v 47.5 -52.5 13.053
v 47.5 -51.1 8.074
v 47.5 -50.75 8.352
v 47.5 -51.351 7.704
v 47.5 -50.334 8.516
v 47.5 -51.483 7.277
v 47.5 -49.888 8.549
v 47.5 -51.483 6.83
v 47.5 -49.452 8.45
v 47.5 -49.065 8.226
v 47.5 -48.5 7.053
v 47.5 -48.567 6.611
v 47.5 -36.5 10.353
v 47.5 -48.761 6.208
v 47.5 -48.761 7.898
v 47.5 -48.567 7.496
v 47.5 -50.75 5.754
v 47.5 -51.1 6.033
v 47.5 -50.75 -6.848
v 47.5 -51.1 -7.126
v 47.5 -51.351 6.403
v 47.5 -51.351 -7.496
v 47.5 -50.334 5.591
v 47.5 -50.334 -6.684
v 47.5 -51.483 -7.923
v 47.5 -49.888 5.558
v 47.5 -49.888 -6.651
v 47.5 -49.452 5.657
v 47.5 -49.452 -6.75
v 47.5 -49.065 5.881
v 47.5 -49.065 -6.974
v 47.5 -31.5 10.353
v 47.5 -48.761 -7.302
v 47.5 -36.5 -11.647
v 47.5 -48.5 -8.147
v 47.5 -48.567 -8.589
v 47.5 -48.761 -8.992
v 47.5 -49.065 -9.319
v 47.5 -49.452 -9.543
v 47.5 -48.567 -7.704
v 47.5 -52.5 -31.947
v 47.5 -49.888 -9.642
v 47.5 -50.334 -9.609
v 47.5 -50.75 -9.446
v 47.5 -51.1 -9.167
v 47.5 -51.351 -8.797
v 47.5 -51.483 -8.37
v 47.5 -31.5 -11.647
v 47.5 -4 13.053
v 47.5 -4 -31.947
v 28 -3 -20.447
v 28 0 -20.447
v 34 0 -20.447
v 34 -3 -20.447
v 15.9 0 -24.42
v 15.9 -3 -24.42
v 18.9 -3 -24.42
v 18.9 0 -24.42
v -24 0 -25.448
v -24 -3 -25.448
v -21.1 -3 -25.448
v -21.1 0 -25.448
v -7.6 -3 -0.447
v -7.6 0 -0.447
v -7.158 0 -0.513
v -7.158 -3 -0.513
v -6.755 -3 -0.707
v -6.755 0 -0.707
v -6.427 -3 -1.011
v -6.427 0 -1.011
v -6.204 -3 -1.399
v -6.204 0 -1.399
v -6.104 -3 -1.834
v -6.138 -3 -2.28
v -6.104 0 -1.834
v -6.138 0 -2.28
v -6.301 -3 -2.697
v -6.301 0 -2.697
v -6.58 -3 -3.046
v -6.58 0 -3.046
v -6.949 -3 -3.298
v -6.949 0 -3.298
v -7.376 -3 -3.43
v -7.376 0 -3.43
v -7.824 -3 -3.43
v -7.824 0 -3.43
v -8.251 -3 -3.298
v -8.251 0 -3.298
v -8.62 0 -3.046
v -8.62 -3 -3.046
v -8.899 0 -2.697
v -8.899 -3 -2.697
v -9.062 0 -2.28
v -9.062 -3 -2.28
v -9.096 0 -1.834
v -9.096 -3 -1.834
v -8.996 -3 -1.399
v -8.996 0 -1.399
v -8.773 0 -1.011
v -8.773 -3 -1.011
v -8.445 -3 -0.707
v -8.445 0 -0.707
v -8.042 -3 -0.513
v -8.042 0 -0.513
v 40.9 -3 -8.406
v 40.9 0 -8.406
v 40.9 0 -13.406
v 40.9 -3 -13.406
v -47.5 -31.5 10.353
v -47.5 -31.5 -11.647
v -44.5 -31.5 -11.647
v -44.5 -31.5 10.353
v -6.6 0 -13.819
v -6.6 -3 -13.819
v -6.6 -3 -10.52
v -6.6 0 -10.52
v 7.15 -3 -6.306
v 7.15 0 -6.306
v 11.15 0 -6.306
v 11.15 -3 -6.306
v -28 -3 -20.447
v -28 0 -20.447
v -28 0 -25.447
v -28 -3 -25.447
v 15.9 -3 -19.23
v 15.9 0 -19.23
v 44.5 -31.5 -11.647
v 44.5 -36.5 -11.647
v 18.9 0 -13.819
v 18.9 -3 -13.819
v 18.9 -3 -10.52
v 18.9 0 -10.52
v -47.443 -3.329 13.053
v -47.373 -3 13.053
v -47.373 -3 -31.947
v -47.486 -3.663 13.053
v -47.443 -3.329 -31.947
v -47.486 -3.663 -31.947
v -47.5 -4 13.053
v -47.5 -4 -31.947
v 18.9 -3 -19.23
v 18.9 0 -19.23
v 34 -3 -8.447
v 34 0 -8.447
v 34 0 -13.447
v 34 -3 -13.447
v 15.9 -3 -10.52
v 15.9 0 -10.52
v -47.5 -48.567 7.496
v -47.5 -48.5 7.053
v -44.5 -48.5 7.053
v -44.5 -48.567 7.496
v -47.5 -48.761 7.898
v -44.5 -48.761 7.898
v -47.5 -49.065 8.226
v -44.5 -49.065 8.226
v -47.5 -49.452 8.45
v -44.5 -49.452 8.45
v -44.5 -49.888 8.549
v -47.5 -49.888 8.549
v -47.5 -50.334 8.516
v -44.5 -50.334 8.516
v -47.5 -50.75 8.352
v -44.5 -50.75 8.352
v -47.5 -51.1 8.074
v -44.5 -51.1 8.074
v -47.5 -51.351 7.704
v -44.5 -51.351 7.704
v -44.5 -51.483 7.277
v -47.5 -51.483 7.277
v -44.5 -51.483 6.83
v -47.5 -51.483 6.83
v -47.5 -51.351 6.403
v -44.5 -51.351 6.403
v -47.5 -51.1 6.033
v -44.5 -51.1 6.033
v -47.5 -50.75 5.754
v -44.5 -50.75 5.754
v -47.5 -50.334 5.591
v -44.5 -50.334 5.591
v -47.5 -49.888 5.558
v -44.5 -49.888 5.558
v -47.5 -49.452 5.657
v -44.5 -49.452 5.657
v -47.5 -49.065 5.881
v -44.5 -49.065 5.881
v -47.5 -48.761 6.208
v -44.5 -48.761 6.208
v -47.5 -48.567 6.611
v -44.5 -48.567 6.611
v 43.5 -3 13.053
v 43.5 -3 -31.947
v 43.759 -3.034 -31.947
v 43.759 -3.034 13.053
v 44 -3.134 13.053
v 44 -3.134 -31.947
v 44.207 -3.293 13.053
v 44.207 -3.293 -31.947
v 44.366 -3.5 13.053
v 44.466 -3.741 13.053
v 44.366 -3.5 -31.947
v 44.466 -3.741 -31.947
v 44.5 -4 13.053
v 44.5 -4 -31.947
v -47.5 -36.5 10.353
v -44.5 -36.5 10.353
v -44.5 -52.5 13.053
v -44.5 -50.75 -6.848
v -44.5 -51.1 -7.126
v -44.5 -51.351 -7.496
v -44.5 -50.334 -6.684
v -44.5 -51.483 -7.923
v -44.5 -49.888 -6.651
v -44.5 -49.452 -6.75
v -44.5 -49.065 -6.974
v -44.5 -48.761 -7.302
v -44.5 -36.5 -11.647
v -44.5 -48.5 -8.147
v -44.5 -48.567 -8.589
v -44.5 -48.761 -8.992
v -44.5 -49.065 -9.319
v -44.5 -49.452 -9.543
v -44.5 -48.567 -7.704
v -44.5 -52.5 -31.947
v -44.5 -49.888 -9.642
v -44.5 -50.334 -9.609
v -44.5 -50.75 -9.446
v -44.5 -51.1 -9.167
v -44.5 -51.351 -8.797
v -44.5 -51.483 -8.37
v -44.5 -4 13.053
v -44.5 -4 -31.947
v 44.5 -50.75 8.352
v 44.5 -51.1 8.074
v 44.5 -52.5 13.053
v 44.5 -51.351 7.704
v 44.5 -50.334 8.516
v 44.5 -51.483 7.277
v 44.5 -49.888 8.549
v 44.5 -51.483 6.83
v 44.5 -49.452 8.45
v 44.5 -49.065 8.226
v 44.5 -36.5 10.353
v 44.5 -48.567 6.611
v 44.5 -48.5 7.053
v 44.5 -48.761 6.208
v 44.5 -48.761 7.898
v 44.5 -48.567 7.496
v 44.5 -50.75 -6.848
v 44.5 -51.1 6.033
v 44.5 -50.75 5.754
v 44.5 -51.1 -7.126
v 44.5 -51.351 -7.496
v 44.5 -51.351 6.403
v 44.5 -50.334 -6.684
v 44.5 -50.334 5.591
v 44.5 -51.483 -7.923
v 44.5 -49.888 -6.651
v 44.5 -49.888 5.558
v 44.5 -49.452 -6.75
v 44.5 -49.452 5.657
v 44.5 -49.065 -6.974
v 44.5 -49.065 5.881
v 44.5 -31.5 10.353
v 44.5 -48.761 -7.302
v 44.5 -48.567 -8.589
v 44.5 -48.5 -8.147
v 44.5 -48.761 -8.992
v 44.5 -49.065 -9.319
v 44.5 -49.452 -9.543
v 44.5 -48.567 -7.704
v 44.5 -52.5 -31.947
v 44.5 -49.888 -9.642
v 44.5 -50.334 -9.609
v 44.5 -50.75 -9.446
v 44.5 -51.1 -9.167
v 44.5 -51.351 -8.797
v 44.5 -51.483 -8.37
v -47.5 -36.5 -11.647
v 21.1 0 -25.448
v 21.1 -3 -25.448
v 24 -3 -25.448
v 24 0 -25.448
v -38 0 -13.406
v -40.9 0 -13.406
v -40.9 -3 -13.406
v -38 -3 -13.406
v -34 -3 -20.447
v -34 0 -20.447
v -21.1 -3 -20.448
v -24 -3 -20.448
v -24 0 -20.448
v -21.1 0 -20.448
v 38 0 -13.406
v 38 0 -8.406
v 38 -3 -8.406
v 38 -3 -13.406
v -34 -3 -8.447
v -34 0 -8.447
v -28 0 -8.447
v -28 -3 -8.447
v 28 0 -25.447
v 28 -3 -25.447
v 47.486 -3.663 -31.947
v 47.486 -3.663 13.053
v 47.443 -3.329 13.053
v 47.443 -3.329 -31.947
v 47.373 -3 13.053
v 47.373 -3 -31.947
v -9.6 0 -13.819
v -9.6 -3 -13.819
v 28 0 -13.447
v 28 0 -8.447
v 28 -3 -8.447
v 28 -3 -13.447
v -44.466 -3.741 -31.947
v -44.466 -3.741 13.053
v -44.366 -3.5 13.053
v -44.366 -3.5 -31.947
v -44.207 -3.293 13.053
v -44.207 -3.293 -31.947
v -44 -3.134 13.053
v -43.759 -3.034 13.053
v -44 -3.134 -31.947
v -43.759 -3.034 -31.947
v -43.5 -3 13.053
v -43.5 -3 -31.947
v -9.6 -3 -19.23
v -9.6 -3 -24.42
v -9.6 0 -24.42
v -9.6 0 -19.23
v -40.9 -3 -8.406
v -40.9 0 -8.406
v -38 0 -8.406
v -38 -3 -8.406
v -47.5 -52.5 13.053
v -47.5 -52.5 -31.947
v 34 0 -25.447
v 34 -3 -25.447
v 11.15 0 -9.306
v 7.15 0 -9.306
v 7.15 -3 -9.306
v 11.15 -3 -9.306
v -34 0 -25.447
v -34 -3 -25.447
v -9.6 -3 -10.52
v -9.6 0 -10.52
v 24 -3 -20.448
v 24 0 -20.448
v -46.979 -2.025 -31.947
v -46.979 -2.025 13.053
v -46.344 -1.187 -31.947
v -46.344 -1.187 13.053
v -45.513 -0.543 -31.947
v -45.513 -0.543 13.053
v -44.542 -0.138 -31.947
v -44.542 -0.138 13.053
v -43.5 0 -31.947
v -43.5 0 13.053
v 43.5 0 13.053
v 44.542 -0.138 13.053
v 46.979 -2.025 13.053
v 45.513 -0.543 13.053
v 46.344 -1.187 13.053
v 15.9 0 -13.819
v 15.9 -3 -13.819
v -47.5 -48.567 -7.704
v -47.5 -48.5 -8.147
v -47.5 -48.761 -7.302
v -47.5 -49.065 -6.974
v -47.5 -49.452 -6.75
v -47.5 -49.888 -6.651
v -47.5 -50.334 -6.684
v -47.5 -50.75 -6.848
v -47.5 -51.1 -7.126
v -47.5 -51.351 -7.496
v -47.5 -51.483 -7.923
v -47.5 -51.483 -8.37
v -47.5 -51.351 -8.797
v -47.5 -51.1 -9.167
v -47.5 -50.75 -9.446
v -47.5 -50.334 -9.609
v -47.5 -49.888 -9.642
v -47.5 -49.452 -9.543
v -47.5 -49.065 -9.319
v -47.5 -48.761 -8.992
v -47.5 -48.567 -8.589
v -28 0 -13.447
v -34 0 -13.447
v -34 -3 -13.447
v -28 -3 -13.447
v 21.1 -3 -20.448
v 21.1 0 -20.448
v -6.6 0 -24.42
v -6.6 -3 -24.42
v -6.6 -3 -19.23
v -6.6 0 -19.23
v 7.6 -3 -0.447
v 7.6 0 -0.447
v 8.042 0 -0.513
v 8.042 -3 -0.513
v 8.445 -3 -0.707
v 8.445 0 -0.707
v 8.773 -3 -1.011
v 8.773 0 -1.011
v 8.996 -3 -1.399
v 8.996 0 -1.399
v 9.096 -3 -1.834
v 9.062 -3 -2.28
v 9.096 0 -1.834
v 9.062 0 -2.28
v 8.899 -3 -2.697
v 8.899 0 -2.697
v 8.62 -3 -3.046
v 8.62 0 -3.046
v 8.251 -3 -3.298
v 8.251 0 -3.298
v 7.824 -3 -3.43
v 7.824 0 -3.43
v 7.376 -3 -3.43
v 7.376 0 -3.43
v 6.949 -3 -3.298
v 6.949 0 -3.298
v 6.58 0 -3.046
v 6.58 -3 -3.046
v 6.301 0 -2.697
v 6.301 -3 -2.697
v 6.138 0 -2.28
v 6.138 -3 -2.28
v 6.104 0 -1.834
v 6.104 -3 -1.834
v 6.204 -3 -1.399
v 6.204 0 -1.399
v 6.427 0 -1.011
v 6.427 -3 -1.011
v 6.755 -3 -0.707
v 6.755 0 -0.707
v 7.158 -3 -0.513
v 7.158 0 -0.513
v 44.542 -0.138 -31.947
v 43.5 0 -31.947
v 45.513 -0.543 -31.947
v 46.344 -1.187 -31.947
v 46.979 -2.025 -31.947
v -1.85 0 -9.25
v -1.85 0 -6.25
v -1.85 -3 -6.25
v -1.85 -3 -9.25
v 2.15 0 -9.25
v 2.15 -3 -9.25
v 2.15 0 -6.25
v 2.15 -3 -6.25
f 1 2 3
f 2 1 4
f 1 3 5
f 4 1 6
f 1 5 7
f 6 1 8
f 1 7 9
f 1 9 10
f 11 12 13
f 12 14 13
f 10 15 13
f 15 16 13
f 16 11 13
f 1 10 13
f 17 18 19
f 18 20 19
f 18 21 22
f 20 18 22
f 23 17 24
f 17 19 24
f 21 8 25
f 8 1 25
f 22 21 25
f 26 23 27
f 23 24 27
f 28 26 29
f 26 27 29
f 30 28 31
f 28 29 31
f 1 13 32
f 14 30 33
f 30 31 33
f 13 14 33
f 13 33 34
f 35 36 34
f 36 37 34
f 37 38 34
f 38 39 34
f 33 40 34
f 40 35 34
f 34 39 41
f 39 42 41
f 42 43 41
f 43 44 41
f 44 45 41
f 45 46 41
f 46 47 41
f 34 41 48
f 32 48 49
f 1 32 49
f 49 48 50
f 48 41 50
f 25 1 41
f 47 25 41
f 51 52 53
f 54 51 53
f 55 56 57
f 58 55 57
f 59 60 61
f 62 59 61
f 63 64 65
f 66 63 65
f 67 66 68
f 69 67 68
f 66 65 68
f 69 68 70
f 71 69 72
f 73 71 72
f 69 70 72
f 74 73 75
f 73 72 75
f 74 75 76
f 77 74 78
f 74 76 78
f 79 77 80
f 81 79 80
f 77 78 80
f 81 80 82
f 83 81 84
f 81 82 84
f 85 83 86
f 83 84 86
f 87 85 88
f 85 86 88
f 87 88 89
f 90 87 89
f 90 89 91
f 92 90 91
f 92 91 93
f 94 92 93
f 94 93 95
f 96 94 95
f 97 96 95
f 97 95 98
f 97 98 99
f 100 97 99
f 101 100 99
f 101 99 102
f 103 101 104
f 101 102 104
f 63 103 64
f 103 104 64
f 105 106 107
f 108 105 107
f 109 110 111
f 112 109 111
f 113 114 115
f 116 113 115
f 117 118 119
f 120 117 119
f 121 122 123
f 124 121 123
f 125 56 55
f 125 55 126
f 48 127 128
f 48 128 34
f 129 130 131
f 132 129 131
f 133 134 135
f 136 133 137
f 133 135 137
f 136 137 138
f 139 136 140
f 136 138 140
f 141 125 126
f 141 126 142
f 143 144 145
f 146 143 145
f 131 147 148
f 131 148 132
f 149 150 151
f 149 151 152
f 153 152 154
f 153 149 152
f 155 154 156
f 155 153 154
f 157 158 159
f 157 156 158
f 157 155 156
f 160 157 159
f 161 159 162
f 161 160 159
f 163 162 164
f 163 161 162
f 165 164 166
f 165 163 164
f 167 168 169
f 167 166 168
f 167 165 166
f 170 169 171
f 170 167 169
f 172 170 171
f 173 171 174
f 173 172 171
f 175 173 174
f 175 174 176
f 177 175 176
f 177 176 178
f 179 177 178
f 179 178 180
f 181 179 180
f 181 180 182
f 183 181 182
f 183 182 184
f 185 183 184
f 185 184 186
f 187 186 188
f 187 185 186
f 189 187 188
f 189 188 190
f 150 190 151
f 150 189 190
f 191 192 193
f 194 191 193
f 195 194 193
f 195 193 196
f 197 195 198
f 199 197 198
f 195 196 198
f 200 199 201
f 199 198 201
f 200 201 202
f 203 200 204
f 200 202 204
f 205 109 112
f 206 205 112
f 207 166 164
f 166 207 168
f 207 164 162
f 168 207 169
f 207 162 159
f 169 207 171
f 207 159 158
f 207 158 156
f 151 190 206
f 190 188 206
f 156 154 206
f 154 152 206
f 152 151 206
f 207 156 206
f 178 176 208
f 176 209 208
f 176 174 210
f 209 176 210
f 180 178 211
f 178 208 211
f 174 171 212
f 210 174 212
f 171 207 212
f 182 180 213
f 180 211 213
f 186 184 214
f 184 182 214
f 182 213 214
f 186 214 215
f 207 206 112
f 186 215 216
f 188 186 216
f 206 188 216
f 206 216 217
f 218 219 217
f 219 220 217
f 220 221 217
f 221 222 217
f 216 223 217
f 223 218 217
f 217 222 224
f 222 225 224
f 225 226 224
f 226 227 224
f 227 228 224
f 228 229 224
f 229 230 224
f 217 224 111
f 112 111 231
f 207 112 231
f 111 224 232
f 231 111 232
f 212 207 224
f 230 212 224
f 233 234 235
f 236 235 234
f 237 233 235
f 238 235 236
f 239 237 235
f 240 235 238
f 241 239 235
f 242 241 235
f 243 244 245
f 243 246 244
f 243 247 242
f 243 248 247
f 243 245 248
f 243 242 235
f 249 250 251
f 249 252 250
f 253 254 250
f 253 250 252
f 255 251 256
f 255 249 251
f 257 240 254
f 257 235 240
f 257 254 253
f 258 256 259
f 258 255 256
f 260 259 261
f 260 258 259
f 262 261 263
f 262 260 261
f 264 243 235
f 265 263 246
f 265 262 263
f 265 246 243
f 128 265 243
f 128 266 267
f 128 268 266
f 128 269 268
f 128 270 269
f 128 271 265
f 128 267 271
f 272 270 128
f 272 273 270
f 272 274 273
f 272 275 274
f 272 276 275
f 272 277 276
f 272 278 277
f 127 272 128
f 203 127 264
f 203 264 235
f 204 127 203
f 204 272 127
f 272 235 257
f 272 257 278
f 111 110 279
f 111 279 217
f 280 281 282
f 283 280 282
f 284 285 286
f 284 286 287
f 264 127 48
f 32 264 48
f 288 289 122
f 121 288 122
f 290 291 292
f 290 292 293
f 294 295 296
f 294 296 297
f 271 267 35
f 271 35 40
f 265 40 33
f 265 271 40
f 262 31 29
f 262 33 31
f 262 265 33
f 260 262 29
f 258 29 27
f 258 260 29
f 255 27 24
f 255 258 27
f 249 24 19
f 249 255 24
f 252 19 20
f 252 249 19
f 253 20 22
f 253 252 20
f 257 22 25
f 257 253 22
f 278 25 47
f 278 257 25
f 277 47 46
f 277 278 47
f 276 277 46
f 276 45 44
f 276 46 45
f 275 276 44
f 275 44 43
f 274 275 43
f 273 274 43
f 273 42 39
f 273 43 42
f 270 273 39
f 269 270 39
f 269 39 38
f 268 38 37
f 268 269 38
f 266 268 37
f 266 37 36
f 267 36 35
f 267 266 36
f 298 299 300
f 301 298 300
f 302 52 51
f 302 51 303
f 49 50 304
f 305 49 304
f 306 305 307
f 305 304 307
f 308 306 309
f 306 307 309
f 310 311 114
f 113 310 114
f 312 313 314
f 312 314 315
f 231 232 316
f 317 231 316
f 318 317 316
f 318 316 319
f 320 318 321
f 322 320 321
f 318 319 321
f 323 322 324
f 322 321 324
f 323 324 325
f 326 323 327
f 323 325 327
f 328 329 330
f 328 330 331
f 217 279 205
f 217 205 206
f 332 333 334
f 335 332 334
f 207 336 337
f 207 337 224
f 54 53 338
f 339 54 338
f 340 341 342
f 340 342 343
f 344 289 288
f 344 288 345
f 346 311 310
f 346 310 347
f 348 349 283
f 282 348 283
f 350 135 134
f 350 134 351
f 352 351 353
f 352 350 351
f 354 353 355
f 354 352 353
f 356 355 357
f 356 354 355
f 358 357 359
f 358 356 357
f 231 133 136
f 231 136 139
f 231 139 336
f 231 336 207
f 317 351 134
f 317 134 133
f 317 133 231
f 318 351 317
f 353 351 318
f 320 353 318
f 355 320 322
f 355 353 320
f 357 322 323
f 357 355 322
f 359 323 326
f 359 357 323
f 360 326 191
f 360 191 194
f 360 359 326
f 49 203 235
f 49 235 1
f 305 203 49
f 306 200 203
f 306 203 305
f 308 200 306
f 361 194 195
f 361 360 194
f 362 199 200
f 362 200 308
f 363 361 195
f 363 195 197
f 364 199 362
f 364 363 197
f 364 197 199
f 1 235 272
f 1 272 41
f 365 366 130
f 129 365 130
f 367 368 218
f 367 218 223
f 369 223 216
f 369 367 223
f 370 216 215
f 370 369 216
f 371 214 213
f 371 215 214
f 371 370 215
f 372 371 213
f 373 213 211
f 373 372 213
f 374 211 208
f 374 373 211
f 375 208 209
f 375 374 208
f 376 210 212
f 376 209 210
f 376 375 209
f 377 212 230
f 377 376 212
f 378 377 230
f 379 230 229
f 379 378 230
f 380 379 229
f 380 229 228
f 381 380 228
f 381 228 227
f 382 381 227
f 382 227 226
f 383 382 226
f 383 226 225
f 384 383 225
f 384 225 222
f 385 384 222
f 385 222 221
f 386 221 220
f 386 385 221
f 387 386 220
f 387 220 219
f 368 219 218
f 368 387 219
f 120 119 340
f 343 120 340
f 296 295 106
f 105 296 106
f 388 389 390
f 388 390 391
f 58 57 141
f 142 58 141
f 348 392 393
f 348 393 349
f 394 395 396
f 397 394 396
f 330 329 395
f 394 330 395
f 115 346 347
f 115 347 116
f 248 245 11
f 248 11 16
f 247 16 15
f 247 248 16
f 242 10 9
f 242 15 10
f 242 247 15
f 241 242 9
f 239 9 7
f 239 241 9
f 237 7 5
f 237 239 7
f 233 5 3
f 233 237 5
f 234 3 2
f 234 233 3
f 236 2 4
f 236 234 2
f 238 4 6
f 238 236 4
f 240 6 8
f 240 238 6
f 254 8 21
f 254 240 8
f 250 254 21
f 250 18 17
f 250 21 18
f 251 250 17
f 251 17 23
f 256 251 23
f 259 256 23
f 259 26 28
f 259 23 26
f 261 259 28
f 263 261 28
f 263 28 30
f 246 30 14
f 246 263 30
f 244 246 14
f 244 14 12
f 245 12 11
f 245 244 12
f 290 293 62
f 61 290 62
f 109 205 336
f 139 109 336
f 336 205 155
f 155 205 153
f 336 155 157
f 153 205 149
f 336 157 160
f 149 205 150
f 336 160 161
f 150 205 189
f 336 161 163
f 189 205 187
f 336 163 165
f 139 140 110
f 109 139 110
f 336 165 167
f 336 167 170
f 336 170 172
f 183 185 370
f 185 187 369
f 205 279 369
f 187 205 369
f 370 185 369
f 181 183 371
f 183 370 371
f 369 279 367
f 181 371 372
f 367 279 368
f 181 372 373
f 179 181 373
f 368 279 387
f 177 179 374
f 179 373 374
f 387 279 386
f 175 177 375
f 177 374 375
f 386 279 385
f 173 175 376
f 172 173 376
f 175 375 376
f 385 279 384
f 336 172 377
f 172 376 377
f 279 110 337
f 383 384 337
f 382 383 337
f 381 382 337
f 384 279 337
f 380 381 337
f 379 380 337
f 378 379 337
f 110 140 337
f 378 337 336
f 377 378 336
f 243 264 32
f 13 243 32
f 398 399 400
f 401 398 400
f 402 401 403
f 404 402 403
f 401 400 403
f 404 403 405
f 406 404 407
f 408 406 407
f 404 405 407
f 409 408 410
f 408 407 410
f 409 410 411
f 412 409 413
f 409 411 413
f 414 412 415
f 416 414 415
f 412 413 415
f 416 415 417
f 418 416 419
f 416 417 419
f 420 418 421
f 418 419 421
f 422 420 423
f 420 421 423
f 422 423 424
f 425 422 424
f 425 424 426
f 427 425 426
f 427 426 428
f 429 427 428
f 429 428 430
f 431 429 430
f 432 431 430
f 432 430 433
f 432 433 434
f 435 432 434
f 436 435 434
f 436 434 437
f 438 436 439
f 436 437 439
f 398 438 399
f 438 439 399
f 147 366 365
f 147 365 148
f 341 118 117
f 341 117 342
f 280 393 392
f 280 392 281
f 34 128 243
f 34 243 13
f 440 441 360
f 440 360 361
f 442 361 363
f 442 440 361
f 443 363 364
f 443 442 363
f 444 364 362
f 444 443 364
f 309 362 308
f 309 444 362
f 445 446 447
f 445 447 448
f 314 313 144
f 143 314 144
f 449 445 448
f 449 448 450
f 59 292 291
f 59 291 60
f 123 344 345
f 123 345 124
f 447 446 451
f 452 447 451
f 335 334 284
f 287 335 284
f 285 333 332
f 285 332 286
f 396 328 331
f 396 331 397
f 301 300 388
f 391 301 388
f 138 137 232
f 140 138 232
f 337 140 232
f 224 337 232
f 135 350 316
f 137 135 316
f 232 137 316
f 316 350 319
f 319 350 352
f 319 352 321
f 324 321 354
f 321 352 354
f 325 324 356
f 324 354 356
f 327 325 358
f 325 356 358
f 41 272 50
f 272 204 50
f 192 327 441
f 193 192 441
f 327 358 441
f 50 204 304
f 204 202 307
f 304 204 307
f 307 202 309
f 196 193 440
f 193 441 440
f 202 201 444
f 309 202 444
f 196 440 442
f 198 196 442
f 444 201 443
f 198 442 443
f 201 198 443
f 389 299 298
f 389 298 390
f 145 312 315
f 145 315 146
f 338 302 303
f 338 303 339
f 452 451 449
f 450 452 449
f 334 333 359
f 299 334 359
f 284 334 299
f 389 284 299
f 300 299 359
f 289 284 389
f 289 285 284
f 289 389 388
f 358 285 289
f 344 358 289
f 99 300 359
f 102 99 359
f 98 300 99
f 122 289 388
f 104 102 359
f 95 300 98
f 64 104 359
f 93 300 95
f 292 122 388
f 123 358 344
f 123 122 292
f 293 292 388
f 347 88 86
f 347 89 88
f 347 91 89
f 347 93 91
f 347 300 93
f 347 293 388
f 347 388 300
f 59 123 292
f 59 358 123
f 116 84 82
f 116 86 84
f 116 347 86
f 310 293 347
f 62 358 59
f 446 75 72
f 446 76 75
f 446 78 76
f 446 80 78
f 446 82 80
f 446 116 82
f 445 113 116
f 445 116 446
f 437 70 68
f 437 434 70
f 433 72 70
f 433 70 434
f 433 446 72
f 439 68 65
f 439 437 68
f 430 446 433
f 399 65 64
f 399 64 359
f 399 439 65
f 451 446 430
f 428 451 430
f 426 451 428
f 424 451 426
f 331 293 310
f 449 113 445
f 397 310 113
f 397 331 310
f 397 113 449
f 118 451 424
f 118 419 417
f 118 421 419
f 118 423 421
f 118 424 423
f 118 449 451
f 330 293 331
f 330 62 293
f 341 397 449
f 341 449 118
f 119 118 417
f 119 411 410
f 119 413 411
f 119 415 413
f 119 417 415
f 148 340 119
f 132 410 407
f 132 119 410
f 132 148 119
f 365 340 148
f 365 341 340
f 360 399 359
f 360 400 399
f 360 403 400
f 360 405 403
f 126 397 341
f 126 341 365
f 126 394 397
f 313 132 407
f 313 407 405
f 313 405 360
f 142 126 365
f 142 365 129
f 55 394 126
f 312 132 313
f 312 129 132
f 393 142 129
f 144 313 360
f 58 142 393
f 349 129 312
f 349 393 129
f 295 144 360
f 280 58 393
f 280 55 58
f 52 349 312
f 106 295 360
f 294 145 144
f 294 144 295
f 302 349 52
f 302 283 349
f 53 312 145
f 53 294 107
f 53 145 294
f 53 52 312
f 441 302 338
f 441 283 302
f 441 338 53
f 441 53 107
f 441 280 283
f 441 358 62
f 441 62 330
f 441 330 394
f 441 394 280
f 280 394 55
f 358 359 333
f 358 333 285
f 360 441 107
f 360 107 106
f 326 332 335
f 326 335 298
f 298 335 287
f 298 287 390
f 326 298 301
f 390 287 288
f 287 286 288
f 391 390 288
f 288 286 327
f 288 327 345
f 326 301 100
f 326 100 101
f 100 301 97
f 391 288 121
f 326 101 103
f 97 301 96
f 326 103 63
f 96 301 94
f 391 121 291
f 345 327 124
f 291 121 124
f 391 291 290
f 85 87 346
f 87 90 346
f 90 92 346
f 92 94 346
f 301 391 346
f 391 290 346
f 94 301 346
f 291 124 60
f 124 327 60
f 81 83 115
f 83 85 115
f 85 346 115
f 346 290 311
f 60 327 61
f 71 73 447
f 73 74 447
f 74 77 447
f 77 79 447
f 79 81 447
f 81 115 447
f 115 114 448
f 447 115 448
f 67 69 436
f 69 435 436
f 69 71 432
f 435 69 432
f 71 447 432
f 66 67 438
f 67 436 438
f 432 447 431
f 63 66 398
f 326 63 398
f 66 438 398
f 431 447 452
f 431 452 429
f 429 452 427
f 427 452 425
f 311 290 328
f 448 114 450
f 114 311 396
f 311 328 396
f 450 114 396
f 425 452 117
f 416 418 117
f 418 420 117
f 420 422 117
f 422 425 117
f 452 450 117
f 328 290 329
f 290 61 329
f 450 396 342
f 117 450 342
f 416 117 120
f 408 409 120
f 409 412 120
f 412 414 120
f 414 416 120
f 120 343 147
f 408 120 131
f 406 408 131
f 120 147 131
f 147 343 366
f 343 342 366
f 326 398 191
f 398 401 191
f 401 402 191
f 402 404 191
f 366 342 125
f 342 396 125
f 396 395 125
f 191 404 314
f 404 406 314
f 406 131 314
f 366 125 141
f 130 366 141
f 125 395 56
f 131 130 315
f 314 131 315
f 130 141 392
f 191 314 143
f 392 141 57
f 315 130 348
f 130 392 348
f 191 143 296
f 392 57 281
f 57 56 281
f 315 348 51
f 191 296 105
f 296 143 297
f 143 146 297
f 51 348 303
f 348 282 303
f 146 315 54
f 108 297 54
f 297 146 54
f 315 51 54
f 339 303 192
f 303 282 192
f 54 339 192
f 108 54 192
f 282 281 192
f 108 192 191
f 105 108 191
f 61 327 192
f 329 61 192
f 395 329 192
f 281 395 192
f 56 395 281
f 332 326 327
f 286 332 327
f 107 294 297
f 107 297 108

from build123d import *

# Parameters (mm, degrees)
SKETCH1_R                  = 1.5
SKETCH1_W                  = 2.9
SKETCH1_H                  = 5
SKETCH1_W_2                = 6
SKETCH1_W_3                = 5
SKETCH1_H_2                = 22
BASE_FLANGE1_DEPTH         = 3
SKETCH34_W                 = 3
SKETCH34_H                 = 5.190452684
SKETCH34_H_2               = 3.298760194
CUT_EXTRUDE2_DEPTH         = 10
SKETCH35_W                 = 4
SKETCH35_H                 = 3
CUT_EXTRUDE3_DEPTH         = 10
SKETCHED_START             = -31.946571622
SKETCHED_BEND1_DEPTH       = 45
SKETCHED_BEND1_2_OUTLINE_W = 3
SKETCHED_BEND1_2_OUTLINE_H = 16
SKETCHED_BEND1_2_DEPTH     = 45
SKETCHED_BEND1_3_OUTLINE_W = 3
SKETCHED_BEND1_3_OUTLINE_H = 5
SKETCHED_BEND1_3_DEPTH     = 20.3
SKETCHED_START_2           = 10.353428378
SKETCHED_BEND1_4_OUTLINE_W = 3
SKETCHED_BEND1_4_OUTLINE_H = 5
SKETCHED_BEND1_4_DEPTH     = 2.7
SKETCHED_START_3           = -48
SKETCHED_BEND1_5_OUTLINE_R = 1.5
SKETCHED_BEND1_5_DEPTH     = 96


with BuildPart() as part:
    # Base-Flange1: sheet metal written as solids
    # Sketch1 → Base-Flange1 (new body)
    with BuildSketch(Plane(origin=(0, 0, 0), x_dir=(1, 0, 0), z_dir=(0, 1, 0))):
        Polygon((-95, 31.946571622), (-95, -13.053428378), (95, -13.053428378), (95, 31.946571622), (45, 31.946571622), (-45, 31.946571622), align=None)
        with Locations(Location((92.5, -7.053428378, 0), (0, 0, 270))):
            Circle(SKETCH1_R, mode=Mode.SUBTRACT)
        with Locations(Location((92.5, 8.146571622, 0), (0, 0, 270))):
            Circle(SKETCH1_R, mode=Mode.SUBTRACT)
        with Locations(Location((-92.5, -7.053428378, 0), (0, 0, 90))):
            Circle(SKETCH1_R, mode=Mode.SUBTRACT)
        with Locations(Location((-92.5, 8.146571622, 0), (0, 0, 90))):
            Circle(SKETCH1_R, mode=Mode.SUBTRACT)
        with Locations(Location((7.6, 1.946571622, 0), (0, 0, 270))):
            Circle(SKETCH1_R, mode=Mode.SUBTRACT)
        with Locations(Location((-7.6, 1.946571622, 0), (0, 0, 270))):
            Circle(SKETCH1_R, mode=Mode.SUBTRACT)
        with Locations((-39.45, 10.905641405)):
            Rectangle(SKETCH1_W, SKETCH1_H, mode=Mode.SUBTRACT)
        with Locations((-22.55, 22.947848405)):
            Rectangle(SKETCH1_W, SKETCH1_H, mode=Mode.SUBTRACT)
        with Locations((-31, 22.946571622)):
            Rectangle(SKETCH1_W_2, SKETCH1_H, mode=Mode.SUBTRACT)
        with Locations((-31, 10.946571622)):
            Rectangle(SKETCH1_W_2, SKETCH1_H, mode=Mode.SUBTRACT)
        with Locations((31, 10.946571622)):
            Rectangle(SKETCH1_W_2, SKETCH1_H, mode=Mode.SUBTRACT)
        with Locations((31, 22.946571622)):
            Rectangle(SKETCH1_W_2, SKETCH1_H, mode=Mode.SUBTRACT)
        with Locations((22.55, 22.947848405)):
            Rectangle(SKETCH1_W, SKETCH1_H, mode=Mode.SUBTRACT)
        with Locations((39.45, 10.905641405)):
            Rectangle(SKETCH1_W, SKETCH1_H, mode=Mode.SUBTRACT)
        with Locations((76.5, 0.646571622)):
            Rectangle(SKETCH1_W_3, SKETCH1_H_2, mode=Mode.SUBTRACT)
        with Locations((-76.5, 0.646571622)):
            Rectangle(SKETCH1_W_3, SKETCH1_H_2, mode=Mode.SUBTRACT)
    extrude(amount=-BASE_FLANGE1_DEPTH)

    # Sketch34 → Cut-Extrude2 (cut)
    with BuildSketch(Plane.XZ.offset(3)):
        with Locations((17.4, -21.824895141)):
            Rectangle(SKETCH34_W, SKETCH34_H)
        with Locations((-8.1, -21.824895141)):
            Rectangle(SKETCH34_W, SKETCH34_H)
        with Locations((-8.1, -12.169238167)):
            Rectangle(SKETCH34_W, SKETCH34_H_2)
        with Locations((17.4, -12.169238167)):
            Rectangle(SKETCH34_W, SKETCH34_H_2)
    extrude(amount=-CUT_EXTRUDE2_DEPTH, mode=Mode.SUBTRACT)

    # Sketch35 → Cut-Extrude3 (cut)
    with BuildSketch(Plane(origin=(0, 0, 0), x_dir=(1, 0, 0), z_dir=(0, 1, 0))):
        with Locations((0.15, 7.74985807)):
            Rectangle(SKETCH35_W, SKETCH35_H)
        with Locations((9.15, 7.806187778)):
            Rectangle(SKETCH35_W, SKETCH35_H)
    extrude(amount=-CUT_EXTRUDE3_DEPTH, mode=Mode.SUBTRACT)

    # Sketched Bend1: read off the stored shape, not the designer's step
    # Sketched Bend1 outline → Sketched Bend1 (cut)
    with BuildSketch(Plane.XY.offset(SKETCHED_START)):
        with BuildLine():
            ThreePointArc((43.5, 0), (45.949489743, -0.83772234), (47.372983346, -3))
            Line((47.372983346, -3), (95, -3))
            Line((95, -3), (95, 0))
            Line((95, 0), (43.5, 0))
        make_face()
        with BuildLine():
            ThreePointArc((-47.372983346, -3), (-45.949489743, -0.83772234), (-43.5, 0))
            Line((-43.5, 0), (-95, 0))
            Line((-95, 0), (-95, -3))
            Line((-95, -3), (-47.372983346, -3))
        make_face()
    extrude(amount=SKETCHED_BEND1_DEPTH, mode=Mode.SUBTRACT)

    # Sketched Bend1 2 outline → Sketched Bend1 2 (add)
    with BuildSketch(Plane.XY.offset(SKETCHED_START)):
        with BuildLine():
            ThreePointArc((43.5, -3), (44.207106781, -3.292893219), (44.5, -4))
            Line((44.5, -4), (44.5, -31.5))
            Line((44.5, -31.5), (47.5, -31.5))
            Line((47.5, -31.5), (47.5, -4))
            ThreePointArc((47.5, -4), (47.468118785, -3.49598283), (47.372983346, -3))
            Line((47.372983346, -3), (43.5, -3))
        make_face()
        with BuildLine():
            ThreePointArc((-44.5, -4), (-44.207106781, -3.292893219), (-43.5, -3))
            Line((-43.5, -3), (-47.372983346, -3))
            ThreePointArc((-47.372983346, -3), (-47.468118785, -3.49598283), (-47.5, -4))
            Line((-47.5, -4), (-47.5, -31.5))
            Line((-47.5, -31.5), (-44.5, -31.5))
            Line((-44.5, -31.5), (-44.5, -4))
        make_face()
        with Locations((46, -44.5)):
            Rectangle(SKETCHED_BEND1_2_OUTLINE_W, SKETCHED_BEND1_2_OUTLINE_H)
        with Locations((-46, -44.5)):
            Rectangle(SKETCHED_BEND1_2_OUTLINE_W, SKETCHED_BEND1_2_OUTLINE_H)
    extrude(amount=SKETCHED_BEND1_2_DEPTH)

    # Sketched Bend1 3 outline → Sketched Bend1 3 (add)
    with BuildSketch(Plane.XY.offset(SKETCHED_START)):
        with Locations((46, -34)):
            Rectangle(SKETCHED_BEND1_3_OUTLINE_W, SKETCHED_BEND1_3_OUTLINE_H)
        with Locations((-46, -34)):
            Rectangle(SKETCHED_BEND1_3_OUTLINE_W, SKETCHED_BEND1_3_OUTLINE_H)
    extrude(amount=SKETCHED_BEND1_3_DEPTH)

    # Sketched Bend1 4 outline → Sketched Bend1 4 (add)
    with BuildSketch(Plane.XY.offset(SKETCHED_START_2)):
        with Locations((46, -34)):
            Rectangle(SKETCHED_BEND1_4_OUTLINE_W, SKETCHED_BEND1_4_OUTLINE_H)
        with Locations((-46, -34)):
            Rectangle(SKETCHED_BEND1_4_OUTLINE_W, SKETCHED_BEND1_4_OUTLINE_H)
    extrude(amount=SKETCHED_BEND1_4_DEPTH)

    # Sketched Bend1 5 outline → Sketched Bend1 5 (cut)
    with BuildSketch(Plane.YZ.offset(SKETCHED_START_3)):
        with Locations((-50, -8.146571622)):
            Circle(SKETCHED_BEND1_5_OUTLINE_R)
        with Locations((-50, 7.053428378)):
            Circle(SKETCHED_BEND1_5_OUTLINE_R)
    extrude(amount=SKETCHED_BEND1_5_DEPTH, mode=Mode.SUBTRACT)


solid = part.part
